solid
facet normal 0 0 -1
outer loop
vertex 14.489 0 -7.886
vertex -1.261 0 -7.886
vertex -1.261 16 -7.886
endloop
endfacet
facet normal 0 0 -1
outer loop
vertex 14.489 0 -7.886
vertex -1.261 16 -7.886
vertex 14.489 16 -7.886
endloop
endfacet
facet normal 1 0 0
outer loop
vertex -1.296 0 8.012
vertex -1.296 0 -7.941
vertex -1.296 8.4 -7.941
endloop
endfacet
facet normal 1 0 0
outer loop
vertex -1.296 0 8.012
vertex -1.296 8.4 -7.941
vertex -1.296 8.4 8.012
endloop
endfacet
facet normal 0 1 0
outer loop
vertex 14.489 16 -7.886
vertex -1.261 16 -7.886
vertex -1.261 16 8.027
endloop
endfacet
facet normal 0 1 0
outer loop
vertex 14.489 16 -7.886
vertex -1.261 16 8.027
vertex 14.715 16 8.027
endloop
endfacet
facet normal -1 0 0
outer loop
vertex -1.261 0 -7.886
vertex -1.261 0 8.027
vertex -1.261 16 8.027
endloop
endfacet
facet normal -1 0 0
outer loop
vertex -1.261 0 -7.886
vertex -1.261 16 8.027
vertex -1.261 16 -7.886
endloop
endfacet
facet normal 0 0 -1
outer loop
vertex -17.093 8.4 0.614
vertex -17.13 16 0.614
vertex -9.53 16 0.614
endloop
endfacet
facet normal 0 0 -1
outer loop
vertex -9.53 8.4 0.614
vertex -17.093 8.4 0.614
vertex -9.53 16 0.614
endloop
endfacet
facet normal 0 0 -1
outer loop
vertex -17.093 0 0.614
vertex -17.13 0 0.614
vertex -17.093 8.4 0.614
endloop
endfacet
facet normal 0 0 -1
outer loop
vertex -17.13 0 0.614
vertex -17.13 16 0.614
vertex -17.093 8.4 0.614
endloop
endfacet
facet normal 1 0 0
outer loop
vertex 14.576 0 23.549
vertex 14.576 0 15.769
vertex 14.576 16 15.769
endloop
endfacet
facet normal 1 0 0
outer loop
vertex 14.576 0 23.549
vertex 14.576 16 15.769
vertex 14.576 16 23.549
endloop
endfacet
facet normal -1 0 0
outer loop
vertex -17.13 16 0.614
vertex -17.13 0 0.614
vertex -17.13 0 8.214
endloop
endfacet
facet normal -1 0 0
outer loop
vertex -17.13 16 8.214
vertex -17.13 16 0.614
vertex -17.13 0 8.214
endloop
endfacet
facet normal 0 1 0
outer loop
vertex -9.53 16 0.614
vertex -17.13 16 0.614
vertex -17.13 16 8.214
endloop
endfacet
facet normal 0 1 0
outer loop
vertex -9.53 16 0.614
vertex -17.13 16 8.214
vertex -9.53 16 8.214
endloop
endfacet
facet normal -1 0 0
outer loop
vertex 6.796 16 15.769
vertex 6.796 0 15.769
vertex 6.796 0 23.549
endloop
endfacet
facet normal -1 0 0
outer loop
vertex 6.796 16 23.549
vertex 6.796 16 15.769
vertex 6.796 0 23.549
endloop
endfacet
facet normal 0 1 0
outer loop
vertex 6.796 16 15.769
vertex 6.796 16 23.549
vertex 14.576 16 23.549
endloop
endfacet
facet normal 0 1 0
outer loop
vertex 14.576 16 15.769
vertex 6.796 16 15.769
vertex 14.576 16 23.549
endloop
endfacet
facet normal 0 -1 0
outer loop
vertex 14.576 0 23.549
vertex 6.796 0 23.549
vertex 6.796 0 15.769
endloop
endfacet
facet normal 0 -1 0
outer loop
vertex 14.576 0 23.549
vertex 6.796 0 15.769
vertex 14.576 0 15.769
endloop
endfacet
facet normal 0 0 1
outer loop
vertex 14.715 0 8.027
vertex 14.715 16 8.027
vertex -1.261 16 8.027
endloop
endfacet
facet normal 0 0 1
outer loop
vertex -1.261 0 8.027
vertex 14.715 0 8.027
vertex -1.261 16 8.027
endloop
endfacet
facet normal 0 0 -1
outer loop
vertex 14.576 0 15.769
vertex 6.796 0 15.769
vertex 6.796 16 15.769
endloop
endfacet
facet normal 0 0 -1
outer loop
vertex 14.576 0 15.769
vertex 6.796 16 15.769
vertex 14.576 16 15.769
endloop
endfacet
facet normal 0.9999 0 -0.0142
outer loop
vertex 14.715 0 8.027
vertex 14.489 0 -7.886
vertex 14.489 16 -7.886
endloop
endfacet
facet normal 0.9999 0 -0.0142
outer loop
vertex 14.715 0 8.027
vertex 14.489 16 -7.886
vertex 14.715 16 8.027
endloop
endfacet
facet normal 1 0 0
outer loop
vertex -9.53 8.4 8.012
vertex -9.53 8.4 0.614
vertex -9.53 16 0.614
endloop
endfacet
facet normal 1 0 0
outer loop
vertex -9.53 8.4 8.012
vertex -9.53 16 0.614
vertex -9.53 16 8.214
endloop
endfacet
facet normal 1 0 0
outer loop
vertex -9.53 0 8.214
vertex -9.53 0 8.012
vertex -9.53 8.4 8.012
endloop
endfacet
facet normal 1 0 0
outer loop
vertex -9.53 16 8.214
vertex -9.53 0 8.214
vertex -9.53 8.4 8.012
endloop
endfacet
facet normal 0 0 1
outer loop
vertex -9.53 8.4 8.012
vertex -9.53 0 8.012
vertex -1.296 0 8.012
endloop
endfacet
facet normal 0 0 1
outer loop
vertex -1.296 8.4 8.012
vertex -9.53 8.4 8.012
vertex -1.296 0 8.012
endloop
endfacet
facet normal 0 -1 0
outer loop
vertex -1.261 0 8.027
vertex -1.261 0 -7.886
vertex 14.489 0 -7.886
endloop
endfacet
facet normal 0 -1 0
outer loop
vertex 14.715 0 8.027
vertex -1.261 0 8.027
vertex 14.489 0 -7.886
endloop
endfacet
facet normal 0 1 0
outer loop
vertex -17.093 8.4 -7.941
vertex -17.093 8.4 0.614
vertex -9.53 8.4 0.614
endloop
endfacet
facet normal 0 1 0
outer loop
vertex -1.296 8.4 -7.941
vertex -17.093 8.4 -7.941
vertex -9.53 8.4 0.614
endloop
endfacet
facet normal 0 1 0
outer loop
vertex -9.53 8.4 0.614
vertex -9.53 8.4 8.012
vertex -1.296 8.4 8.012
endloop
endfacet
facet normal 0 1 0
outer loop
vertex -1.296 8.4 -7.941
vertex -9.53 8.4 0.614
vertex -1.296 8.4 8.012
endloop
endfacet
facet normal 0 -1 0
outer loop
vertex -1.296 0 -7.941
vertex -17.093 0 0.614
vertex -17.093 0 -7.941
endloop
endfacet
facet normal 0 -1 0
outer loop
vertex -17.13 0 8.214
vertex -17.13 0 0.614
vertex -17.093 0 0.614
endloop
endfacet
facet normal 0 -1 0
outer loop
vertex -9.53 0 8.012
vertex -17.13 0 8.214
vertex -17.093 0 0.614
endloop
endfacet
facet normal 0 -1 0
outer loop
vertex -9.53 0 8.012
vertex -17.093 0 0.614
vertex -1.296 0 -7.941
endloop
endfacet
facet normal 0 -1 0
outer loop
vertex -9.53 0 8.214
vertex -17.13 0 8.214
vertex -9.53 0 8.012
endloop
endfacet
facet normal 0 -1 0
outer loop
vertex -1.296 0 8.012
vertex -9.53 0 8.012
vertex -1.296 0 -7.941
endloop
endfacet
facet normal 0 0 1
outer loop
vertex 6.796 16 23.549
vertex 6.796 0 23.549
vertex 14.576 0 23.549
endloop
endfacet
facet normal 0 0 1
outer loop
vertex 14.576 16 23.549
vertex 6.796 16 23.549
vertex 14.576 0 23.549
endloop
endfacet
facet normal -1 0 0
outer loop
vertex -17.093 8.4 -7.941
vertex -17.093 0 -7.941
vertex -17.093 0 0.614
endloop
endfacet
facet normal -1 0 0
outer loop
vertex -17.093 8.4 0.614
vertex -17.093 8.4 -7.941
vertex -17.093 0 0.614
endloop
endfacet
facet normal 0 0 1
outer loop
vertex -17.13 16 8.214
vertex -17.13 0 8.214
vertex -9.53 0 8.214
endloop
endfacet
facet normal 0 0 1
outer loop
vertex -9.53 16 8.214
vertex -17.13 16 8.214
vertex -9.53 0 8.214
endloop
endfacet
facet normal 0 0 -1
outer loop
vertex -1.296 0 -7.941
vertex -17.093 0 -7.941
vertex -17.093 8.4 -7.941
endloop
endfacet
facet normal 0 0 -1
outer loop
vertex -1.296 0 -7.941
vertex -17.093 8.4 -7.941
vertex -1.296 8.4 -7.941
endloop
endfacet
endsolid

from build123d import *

# Parameters (mm, degrees)
F1_W     = 7.78
F1_H     = 7.78
F2_DEPTH = 16
F3_W     = 15.79667
F3_H     = 15.953074
F4_DEPTH = 8.4
F5_W     = 7.6
F5_H     = 7.6
F6_DEPTH = 16


with BuildPart() as f2:
    # F1 (on face) → F2 (new body)
    with BuildSketch(Plane.XZ):
        with Locations((10.685841, 19.659452)):
            Rectangle(F1_W, F1_H)
        Polygon((-1.260831, -7.886019), (14.489169, -7.886019), (14.714791, 8.02733), (-1.260831, 8.02733), (-1.260831, 0), align=None)
    extrude(amount=-F2_DEPTH)


with BuildPart() as f4:
    # F3 (on face) → F4 (new body)
    with BuildSketch(Plane.XZ):
        with Locations((-9.19418, 0.035276)):
            Rectangle(F3_W, F3_H)
    extrude(amount=-F4_DEPTH)

    # F5 (on face) → F6 (join)
    with BuildSketch(Plane.XZ):
        with Locations((-13.330464, 4.413988)):
            Rectangle(F5_W, F5_H)
    extrude(amount=-F6_DEPTH)


solid = Compound([f2.part, f4.part])
